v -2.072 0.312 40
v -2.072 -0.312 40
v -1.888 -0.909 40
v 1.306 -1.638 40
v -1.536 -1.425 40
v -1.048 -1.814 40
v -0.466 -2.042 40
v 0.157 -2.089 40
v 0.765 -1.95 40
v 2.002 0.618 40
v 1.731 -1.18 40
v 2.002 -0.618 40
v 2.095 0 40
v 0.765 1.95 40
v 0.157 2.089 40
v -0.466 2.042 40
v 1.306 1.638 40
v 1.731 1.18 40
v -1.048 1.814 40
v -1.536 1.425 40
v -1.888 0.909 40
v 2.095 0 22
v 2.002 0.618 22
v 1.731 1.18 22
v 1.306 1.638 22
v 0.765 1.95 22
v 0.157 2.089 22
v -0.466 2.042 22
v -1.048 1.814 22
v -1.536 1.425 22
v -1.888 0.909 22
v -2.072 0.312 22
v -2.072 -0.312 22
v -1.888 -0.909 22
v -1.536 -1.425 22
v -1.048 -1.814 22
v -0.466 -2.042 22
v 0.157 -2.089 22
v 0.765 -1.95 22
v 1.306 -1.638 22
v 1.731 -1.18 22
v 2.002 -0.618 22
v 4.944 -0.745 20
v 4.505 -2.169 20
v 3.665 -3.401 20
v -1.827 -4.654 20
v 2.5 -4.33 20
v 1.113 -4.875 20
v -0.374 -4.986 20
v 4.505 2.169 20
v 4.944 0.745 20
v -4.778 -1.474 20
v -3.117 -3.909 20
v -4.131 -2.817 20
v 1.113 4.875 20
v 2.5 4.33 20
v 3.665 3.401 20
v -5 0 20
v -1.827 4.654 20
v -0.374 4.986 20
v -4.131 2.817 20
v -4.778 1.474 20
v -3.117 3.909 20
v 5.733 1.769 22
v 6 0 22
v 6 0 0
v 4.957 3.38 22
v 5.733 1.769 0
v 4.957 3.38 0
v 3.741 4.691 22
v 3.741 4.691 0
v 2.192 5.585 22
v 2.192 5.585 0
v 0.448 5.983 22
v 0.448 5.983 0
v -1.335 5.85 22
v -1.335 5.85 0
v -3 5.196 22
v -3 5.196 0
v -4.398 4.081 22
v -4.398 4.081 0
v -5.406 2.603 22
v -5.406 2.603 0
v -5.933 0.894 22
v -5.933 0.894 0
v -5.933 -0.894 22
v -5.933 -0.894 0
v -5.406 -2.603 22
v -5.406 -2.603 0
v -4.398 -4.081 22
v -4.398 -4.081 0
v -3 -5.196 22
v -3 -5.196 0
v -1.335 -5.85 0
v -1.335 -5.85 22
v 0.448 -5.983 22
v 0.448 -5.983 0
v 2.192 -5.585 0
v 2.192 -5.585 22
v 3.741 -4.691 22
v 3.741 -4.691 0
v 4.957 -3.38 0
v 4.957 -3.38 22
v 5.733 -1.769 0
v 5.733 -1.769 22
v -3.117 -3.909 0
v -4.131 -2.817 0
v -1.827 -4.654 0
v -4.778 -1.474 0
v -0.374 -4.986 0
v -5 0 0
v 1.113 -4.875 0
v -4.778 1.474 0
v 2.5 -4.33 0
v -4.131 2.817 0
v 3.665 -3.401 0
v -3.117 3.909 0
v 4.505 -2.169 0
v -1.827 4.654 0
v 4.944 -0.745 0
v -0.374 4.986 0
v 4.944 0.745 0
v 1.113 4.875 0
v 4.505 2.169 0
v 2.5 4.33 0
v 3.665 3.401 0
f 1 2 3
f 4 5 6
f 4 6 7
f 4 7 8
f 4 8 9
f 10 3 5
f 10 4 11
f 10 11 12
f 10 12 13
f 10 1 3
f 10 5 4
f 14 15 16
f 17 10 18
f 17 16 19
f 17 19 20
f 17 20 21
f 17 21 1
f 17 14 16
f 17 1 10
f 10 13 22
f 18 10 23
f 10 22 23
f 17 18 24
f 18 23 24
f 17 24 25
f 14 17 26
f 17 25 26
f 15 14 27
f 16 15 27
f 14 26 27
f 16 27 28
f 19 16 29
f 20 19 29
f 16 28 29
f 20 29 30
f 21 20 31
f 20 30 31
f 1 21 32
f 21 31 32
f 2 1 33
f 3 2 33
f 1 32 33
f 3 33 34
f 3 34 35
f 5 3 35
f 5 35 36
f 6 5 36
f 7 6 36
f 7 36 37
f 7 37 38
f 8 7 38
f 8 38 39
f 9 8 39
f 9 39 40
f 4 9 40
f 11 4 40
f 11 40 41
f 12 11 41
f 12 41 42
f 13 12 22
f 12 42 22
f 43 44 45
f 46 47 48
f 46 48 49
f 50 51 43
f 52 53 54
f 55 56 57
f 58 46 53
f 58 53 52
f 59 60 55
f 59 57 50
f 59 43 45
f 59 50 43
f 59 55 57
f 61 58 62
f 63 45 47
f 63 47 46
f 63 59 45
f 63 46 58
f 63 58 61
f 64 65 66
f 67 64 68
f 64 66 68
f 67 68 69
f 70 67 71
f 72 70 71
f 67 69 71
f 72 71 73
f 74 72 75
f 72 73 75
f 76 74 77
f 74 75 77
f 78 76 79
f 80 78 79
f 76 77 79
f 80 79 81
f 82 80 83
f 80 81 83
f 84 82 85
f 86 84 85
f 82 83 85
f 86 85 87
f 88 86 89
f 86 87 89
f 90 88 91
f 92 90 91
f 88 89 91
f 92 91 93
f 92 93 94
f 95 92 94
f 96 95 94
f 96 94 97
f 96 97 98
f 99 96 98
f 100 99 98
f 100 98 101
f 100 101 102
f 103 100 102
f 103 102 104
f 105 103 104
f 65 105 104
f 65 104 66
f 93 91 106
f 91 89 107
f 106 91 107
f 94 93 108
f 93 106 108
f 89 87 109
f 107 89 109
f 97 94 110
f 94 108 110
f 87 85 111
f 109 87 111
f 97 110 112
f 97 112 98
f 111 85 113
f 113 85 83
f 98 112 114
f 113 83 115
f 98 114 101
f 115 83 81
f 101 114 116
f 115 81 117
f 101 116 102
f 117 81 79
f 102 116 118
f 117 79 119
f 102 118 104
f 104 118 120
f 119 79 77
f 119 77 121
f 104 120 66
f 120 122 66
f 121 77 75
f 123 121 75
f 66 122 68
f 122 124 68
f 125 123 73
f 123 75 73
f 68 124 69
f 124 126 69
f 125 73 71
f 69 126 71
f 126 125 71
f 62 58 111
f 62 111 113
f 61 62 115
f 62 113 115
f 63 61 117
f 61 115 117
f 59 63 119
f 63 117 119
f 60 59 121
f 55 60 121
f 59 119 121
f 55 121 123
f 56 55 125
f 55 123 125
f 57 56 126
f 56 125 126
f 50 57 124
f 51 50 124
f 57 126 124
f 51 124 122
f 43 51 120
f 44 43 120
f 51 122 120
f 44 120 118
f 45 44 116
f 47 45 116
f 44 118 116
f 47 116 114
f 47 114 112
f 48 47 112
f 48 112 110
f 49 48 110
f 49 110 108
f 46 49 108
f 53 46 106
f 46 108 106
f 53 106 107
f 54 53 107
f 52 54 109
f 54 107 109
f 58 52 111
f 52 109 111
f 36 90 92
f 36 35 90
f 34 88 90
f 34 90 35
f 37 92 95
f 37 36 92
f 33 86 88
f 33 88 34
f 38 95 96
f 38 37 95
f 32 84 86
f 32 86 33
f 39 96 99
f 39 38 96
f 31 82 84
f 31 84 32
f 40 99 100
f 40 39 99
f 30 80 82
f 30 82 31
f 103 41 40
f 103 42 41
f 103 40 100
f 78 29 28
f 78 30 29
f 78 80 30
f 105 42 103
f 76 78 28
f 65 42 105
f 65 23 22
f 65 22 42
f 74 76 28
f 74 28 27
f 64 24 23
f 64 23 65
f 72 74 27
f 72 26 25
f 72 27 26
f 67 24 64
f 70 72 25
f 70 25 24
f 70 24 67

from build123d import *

# Parameters (mm, degrees)
SKETCH5_R           = 6
BOSS_EXTRUDE4_DEPTH = 40
SKETCH6_R           = 5
CUT_EXTRUDE1_DEPTH  = 20
CUT_EXTRUDE2_START  = -18
SKETCH7_R           = 6
CUT_EXTRUDE2_DEPTH  = 18
SKETCH8_R           = 2.095
BOSS_EXTRUDE5_DEPTH = 18


with BuildPart() as part:
    # Sketch5 → Boss-Extrude4 (new body)
    with BuildSketch(Plane.XY):
        Circle(SKETCH5_R)
    extrude(amount=BOSS_EXTRUDE4_DEPTH)

    # Sketch6 → Cut-Extrude1 (cut)
    with BuildSketch(Plane(origin=(0, 0, 0), x_dir=(-1, 0, 0), z_dir=(0, 0, -1))):
        Circle(SKETCH6_R)
    extrude(amount=-CUT_EXTRUDE1_DEPTH, mode=Mode.SUBTRACT)

    # Sketch7 → Cut-Extrude2 (cut)
    with BuildSketch(Plane.XY.offset(40).offset(CUT_EXTRUDE2_START)):
        Circle(SKETCH7_R)
    extrude(amount=CUT_EXTRUDE2_DEPTH, mode=Mode.SUBTRACT)

    # Sketch8 → Boss-Extrude5 (add)
    with BuildSketch(Plane.XY.offset(22)):
        Circle(SKETCH8_R)
    extrude(amount=BOSS_EXTRUDE5_DEPTH)


solid = part.part
